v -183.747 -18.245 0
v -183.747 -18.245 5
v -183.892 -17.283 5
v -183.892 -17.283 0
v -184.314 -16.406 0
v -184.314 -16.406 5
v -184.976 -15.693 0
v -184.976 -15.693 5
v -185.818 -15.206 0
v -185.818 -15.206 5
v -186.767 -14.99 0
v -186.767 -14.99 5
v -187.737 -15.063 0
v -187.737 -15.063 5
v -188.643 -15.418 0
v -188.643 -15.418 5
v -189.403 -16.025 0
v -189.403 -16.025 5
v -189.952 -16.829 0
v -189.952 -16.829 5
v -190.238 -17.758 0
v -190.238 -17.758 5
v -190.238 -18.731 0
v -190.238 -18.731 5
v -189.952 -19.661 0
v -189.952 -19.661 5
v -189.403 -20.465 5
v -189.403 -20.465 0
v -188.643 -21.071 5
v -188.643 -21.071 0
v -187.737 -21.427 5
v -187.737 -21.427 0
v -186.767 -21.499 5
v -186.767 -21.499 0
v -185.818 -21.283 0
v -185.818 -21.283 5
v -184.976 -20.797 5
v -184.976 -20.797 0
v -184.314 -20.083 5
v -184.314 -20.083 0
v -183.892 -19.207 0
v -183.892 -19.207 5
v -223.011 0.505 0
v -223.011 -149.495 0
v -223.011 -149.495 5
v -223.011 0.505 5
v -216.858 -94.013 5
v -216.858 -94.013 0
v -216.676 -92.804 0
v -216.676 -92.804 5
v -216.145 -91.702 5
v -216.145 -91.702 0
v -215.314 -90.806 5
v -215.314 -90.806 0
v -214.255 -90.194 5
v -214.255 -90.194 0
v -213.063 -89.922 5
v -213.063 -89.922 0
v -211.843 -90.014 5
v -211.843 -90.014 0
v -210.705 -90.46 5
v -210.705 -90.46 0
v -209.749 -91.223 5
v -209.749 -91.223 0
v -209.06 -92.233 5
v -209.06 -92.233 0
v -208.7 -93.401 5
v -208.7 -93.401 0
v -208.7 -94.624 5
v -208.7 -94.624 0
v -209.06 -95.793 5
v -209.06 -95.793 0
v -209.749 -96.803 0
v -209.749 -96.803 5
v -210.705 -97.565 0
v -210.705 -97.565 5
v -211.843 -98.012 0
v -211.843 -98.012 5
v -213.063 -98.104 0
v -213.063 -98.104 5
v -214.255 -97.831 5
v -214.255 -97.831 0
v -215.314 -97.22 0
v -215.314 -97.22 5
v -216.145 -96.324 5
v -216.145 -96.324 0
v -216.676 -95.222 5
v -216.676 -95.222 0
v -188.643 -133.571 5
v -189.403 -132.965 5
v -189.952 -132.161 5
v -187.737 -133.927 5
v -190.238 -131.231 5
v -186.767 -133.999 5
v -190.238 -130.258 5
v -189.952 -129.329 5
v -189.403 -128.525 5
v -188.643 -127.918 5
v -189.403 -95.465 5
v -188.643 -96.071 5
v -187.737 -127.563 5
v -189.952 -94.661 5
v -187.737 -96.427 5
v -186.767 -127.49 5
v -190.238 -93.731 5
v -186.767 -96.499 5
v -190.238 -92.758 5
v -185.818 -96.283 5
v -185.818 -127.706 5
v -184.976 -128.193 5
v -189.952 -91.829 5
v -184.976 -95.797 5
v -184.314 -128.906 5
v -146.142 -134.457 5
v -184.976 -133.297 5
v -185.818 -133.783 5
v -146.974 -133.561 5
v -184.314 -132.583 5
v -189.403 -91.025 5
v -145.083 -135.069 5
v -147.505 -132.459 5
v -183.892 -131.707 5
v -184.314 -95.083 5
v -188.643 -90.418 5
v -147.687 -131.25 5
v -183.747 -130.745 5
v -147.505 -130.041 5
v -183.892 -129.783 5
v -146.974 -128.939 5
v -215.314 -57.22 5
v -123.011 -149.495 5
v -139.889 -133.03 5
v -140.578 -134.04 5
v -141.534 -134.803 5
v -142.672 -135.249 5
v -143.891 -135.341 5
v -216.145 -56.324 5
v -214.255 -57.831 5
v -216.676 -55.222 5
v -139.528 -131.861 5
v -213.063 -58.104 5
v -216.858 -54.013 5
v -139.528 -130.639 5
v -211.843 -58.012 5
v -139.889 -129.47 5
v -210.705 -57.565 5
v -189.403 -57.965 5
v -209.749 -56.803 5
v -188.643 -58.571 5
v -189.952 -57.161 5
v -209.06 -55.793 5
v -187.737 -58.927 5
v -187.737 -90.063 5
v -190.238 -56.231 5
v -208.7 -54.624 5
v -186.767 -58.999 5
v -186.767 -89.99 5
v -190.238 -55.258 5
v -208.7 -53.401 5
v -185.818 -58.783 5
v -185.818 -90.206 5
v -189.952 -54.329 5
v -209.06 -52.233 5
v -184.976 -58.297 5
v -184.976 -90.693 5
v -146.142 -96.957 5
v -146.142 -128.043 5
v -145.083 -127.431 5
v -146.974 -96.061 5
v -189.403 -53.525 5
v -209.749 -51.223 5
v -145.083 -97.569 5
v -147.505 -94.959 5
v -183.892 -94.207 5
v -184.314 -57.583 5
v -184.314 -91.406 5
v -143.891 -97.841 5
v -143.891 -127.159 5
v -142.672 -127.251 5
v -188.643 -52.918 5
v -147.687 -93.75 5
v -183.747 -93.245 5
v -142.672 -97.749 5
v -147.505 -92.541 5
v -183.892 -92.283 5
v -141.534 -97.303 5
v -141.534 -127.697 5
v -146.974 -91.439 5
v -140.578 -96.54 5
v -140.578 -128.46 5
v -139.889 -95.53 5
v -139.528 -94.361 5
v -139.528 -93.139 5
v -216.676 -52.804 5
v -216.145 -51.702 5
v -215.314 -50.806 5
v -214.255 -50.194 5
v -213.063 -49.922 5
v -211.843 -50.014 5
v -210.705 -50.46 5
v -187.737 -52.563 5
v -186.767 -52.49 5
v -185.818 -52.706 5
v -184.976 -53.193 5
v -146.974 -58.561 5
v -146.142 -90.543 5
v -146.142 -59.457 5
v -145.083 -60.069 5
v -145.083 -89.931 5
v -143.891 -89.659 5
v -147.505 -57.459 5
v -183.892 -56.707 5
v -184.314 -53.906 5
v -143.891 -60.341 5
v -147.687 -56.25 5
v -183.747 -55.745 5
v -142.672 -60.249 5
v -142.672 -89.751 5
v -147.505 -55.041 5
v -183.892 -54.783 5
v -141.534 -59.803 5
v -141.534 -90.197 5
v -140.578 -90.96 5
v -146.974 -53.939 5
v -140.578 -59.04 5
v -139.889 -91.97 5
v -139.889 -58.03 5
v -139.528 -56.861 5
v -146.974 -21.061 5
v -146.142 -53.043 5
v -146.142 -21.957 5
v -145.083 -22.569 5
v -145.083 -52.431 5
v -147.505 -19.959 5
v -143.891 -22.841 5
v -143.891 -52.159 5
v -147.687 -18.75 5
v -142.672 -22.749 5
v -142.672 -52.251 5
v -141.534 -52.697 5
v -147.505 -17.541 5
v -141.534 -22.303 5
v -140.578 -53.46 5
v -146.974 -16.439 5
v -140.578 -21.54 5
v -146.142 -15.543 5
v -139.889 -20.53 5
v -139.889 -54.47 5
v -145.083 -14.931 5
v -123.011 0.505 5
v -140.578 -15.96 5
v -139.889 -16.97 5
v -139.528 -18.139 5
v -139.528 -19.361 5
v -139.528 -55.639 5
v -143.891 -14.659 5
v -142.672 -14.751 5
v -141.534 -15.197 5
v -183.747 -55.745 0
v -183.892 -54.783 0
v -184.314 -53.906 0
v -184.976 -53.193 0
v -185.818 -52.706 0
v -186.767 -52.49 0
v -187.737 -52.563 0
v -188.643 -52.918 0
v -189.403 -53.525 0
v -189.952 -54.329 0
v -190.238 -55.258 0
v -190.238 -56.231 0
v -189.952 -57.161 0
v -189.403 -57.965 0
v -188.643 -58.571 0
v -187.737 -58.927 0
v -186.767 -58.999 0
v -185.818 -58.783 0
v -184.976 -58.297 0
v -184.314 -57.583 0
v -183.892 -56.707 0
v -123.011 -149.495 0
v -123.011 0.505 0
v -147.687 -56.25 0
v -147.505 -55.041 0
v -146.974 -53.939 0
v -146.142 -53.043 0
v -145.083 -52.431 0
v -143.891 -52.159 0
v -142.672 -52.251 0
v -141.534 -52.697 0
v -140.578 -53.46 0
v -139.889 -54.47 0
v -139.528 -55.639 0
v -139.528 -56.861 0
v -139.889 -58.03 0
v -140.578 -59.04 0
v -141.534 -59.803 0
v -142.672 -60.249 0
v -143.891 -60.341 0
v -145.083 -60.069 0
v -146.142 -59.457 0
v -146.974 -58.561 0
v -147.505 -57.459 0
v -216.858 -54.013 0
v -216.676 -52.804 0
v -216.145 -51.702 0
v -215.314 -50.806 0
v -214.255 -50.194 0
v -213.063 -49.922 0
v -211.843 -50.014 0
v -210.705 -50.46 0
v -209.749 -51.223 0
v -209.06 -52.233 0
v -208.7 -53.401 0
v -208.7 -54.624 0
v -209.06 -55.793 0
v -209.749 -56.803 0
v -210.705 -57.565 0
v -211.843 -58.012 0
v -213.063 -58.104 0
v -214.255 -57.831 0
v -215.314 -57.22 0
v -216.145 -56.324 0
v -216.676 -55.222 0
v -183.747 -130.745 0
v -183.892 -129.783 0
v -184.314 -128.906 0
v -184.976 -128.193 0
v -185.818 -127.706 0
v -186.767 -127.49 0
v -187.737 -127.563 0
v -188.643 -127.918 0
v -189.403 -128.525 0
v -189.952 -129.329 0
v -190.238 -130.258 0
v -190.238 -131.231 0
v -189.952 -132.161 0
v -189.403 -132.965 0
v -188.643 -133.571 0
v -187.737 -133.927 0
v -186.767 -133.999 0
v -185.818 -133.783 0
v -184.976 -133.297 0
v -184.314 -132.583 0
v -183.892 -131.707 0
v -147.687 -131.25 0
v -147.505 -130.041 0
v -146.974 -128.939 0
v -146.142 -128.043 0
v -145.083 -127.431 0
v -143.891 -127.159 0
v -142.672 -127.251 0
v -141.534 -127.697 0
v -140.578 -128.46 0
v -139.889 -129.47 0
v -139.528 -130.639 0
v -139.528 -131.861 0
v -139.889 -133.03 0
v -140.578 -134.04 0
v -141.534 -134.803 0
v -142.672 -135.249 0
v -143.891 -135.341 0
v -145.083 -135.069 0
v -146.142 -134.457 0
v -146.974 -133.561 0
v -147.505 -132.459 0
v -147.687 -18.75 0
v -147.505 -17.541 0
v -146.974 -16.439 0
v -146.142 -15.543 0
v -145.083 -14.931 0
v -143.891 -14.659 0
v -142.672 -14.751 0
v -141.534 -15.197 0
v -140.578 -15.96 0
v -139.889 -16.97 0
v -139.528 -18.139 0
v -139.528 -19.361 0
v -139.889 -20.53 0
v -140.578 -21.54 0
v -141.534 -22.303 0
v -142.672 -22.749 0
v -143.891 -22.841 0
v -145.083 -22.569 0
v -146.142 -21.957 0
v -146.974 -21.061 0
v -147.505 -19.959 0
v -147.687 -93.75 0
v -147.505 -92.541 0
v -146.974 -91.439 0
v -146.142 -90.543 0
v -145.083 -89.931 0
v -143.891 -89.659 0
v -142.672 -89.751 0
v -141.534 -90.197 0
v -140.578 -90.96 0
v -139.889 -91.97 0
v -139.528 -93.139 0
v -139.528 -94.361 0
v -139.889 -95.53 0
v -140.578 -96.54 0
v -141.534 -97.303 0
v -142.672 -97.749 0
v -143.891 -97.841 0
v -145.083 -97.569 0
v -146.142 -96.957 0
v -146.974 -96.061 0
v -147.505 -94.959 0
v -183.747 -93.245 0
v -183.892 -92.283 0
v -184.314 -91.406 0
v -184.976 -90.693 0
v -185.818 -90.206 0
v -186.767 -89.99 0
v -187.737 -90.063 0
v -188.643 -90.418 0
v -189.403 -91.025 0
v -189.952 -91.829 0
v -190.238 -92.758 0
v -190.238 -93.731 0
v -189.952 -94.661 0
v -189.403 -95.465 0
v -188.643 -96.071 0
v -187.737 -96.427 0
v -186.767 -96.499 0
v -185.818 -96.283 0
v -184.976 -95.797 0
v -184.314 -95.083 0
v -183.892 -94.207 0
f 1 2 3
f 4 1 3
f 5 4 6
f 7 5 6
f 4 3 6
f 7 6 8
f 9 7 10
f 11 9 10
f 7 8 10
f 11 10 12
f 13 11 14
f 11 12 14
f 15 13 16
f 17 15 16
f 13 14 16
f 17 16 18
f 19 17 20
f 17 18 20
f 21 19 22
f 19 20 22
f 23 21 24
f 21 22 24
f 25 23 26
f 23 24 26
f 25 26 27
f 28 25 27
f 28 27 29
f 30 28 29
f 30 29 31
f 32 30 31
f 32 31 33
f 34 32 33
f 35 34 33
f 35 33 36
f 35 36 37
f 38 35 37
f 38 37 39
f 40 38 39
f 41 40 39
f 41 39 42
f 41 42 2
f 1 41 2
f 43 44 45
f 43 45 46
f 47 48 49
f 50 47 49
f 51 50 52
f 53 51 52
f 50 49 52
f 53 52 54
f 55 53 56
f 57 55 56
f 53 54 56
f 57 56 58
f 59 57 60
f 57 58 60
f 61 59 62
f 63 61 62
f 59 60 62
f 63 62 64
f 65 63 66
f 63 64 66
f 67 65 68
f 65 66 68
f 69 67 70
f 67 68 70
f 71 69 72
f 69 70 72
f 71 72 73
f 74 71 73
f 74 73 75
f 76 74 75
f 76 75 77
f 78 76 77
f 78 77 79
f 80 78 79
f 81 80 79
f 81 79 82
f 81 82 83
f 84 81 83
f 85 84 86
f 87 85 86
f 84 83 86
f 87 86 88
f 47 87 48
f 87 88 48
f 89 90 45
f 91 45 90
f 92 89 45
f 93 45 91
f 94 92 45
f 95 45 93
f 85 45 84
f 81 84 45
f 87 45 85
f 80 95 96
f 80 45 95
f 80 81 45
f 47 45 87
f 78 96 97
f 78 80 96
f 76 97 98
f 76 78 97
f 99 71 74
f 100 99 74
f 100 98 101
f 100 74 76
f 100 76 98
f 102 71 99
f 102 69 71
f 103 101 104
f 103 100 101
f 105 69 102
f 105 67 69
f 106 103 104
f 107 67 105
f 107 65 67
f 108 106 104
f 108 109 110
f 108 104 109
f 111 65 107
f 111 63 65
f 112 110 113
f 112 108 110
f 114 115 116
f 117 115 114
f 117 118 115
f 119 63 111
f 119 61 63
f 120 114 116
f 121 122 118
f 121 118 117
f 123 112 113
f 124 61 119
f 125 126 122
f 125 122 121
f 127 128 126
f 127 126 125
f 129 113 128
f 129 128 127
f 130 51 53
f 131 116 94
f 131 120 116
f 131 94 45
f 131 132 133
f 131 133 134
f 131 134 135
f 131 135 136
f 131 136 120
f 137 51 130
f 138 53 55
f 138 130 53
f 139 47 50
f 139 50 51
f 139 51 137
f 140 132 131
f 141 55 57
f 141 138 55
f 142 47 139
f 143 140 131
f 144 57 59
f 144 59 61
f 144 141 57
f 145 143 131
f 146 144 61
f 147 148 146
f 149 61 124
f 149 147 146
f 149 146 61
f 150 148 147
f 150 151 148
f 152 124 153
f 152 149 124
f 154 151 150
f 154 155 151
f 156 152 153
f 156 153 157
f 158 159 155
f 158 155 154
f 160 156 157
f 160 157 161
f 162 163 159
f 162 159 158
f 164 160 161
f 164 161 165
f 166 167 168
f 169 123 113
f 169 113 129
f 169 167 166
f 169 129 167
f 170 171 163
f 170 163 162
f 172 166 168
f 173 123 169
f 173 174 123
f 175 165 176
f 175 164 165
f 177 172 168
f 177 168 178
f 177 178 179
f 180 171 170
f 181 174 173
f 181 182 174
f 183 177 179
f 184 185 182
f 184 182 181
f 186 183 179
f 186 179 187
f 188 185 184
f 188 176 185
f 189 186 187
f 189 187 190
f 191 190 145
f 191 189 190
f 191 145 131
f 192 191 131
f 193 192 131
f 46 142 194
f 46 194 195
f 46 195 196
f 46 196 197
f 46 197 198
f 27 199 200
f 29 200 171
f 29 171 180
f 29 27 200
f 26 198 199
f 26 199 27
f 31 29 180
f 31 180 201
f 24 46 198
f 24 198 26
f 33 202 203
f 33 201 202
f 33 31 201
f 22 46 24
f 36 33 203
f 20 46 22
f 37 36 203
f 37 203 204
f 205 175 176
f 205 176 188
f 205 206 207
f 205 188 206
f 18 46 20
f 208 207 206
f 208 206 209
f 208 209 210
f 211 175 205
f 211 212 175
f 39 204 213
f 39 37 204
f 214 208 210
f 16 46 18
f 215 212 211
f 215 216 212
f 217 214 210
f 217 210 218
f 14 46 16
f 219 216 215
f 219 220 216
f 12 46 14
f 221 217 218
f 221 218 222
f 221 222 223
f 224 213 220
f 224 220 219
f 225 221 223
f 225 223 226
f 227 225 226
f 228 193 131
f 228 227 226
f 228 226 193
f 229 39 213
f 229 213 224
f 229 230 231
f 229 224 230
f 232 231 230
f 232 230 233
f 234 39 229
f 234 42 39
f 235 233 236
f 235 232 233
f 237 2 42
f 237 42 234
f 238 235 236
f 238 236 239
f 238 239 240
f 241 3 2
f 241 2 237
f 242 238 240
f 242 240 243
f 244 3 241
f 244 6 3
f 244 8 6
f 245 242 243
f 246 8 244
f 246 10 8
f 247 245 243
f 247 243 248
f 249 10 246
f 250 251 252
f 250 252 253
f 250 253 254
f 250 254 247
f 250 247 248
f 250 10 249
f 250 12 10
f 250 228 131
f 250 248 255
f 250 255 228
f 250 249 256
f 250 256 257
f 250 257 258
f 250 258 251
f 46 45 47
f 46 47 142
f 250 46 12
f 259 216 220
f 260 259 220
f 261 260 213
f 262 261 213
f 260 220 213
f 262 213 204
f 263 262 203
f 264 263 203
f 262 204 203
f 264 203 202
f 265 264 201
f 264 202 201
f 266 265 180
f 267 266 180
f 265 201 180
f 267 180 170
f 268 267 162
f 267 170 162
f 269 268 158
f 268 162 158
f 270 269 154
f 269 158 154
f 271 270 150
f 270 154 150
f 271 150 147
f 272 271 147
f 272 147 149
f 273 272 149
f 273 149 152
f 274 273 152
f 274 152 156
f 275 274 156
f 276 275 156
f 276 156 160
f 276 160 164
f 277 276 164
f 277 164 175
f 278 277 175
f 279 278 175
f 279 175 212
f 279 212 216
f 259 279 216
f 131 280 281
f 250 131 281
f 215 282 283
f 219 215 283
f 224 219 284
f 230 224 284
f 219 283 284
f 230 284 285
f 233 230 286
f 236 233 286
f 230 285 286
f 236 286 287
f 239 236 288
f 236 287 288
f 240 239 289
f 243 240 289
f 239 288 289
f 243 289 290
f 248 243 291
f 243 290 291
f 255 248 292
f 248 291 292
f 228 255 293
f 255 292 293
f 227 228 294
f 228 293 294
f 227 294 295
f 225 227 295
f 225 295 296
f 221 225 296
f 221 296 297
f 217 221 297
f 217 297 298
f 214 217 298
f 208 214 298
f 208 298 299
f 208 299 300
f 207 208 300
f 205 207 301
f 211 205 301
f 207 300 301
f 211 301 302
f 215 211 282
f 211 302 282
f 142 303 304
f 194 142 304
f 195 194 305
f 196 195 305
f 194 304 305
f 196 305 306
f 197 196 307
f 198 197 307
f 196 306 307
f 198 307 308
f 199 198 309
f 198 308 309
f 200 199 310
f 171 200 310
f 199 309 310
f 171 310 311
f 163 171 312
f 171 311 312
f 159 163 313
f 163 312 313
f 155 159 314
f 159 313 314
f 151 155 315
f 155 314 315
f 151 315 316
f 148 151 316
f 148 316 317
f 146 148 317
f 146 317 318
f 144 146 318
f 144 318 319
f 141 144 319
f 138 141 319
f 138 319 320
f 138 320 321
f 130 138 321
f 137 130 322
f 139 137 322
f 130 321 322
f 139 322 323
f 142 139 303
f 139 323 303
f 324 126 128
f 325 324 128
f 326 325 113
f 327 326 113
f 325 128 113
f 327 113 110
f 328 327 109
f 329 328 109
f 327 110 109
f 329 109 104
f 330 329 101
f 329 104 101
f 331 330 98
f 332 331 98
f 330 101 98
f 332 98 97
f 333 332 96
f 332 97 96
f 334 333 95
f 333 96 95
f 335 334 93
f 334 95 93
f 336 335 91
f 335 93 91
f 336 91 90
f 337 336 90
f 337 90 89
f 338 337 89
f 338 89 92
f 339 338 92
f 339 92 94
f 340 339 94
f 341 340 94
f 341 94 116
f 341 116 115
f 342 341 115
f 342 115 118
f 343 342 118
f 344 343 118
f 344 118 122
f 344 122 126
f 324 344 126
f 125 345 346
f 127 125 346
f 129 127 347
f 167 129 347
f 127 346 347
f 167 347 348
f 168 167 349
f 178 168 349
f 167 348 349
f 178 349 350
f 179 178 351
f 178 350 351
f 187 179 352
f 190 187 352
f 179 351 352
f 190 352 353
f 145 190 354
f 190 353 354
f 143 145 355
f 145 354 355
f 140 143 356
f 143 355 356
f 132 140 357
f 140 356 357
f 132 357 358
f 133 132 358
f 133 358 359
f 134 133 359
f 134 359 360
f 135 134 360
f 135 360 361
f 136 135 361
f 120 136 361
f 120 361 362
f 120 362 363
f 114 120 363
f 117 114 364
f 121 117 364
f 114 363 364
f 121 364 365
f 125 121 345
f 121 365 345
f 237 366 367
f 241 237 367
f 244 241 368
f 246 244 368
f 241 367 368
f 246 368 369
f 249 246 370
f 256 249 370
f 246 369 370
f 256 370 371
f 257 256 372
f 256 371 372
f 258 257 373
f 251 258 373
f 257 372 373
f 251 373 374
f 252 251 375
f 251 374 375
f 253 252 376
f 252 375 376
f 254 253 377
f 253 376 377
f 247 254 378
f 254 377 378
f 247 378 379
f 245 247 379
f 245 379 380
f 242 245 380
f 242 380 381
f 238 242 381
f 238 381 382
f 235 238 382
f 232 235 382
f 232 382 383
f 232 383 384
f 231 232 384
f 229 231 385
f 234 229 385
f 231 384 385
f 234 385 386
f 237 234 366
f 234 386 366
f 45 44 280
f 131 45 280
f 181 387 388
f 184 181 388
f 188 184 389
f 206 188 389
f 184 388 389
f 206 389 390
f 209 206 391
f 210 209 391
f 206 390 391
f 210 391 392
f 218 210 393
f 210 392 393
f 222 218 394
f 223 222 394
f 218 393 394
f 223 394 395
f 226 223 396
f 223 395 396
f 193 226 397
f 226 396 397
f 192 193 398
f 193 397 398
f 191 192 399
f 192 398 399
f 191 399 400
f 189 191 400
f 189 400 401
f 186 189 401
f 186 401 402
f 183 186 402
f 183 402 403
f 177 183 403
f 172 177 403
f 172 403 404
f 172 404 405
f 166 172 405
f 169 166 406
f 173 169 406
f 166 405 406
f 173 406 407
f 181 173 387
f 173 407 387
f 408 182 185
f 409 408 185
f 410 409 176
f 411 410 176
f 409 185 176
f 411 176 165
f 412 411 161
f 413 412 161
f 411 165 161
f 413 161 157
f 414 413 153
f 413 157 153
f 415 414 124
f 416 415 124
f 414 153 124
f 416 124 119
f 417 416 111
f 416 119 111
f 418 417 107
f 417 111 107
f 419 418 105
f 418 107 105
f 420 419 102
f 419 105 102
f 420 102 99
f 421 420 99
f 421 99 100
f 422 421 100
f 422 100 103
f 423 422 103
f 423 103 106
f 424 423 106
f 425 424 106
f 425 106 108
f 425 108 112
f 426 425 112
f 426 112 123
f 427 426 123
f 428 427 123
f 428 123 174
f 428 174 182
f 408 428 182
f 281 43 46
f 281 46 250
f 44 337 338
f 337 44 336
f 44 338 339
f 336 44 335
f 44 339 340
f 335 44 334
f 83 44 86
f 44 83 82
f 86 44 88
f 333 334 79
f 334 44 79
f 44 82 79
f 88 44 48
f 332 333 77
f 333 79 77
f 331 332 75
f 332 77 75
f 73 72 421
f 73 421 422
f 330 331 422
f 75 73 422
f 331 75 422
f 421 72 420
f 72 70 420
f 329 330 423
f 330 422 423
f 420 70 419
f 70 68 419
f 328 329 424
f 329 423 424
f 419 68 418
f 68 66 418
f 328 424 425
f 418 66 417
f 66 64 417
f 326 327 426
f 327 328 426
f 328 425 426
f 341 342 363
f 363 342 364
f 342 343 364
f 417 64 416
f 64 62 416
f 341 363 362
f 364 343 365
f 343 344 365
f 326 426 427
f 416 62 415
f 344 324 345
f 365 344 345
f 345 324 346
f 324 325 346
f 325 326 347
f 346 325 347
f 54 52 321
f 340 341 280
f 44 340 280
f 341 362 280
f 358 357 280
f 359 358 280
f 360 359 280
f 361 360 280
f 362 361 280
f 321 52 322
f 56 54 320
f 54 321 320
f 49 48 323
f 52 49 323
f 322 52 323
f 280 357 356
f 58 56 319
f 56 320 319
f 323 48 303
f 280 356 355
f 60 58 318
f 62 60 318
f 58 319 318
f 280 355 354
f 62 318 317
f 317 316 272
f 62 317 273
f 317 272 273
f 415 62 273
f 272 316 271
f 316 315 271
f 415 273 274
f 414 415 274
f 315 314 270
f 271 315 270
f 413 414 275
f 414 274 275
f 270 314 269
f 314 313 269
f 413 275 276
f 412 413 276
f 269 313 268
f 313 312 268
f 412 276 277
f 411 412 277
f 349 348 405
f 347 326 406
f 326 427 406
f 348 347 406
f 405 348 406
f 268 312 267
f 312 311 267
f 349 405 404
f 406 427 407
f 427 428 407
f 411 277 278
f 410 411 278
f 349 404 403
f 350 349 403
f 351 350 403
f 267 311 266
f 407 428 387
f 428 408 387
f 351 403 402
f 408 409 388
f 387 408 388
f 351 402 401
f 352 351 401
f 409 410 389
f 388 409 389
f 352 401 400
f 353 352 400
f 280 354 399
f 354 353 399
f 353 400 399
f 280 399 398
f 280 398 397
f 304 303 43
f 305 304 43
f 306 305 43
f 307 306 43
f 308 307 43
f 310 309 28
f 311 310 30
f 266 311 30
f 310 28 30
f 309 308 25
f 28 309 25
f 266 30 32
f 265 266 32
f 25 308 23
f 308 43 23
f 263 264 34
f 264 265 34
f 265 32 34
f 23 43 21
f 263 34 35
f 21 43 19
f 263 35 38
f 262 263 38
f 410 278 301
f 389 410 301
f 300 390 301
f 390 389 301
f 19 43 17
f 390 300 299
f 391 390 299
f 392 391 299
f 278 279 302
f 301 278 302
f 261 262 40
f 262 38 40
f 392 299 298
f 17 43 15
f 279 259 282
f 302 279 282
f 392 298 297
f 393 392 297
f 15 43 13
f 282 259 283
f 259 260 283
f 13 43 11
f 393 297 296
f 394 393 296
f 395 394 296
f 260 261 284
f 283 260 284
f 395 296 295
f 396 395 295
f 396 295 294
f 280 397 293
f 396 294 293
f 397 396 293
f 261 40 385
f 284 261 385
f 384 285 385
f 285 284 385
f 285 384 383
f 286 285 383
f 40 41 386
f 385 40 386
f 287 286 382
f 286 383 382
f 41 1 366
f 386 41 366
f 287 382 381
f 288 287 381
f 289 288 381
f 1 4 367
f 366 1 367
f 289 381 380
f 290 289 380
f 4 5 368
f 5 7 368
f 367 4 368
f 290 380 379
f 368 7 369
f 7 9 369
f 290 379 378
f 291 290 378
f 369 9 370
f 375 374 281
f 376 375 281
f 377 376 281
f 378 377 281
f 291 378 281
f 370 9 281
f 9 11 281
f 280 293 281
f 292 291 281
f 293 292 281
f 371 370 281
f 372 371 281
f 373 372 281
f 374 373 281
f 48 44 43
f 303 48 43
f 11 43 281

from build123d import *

# Parameters (mm, degrees)
SKETCH2_W           = 100
SKETCH2_H           = 150
BOSS_EXTRUDE1_DEPTH = 5
SKETCH3_R           = 4.1021
CUT_EXTRUDE1_DEPTH  = 5
SKETCH6_R           = 3.2639
CUT_EXTRUDE2_DEPTH  = 269.528430204


with BuildPart() as part:
    # Sketch2 → Boss-Extrude1 (new body)
    with BuildSketch(Plane.XY):
        with Locations((-173.010889244, -74.49468588)):
            Rectangle(SKETCH2_W, SKETCH2_H)
    extrude(amount=BOSS_EXTRUDE1_DEPTH)

    # Sketch3 → Cut-Extrude1 (cut)
    with BuildSketch(Plane(origin=(0, 0, 0), x_dir=(-1, 0, 0), z_dir=(0, 0, -1))):
        with Locations((212.756022811, -54.012878845)):
            Circle(SKETCH3_R)
        with Locations((212.756022811, -94.012878845)):
            Circle(SKETCH3_R)
        with Locations((143.584758496, -18.75)):
            Circle(SKETCH3_R)
        with Locations((143.584758496, -56.25)):
            Circle(SKETCH3_R)
        with Locations((143.584758496, -93.75)):
            Circle(SKETCH3_R)
        with Locations((143.584758496, -131.25)):
            Circle(SKETCH3_R)
    extrude(amount=-CUT_EXTRUDE1_DEPTH, mode=Mode.SUBTRACT)

    # Sketch6 → Cut-Extrude2 (cut, through all)
    with BuildSketch(Plane.XY.offset(5)):
        with Locations((-187.010889244, -18.24468588)):
            Circle(SKETCH6_R)
        with Locations((-187.010889244, -55.74468588)):
            Circle(SKETCH6_R)
        with Locations((-187.010889244, -93.24468588)):
            Circle(SKETCH6_R)
        with Locations((-187.010889244, -130.74468588)):
            Circle(SKETCH6_R)
    extrude(amount=-CUT_EXTRUDE2_DEPTH, mode=Mode.SUBTRACT)


solid = part.part
